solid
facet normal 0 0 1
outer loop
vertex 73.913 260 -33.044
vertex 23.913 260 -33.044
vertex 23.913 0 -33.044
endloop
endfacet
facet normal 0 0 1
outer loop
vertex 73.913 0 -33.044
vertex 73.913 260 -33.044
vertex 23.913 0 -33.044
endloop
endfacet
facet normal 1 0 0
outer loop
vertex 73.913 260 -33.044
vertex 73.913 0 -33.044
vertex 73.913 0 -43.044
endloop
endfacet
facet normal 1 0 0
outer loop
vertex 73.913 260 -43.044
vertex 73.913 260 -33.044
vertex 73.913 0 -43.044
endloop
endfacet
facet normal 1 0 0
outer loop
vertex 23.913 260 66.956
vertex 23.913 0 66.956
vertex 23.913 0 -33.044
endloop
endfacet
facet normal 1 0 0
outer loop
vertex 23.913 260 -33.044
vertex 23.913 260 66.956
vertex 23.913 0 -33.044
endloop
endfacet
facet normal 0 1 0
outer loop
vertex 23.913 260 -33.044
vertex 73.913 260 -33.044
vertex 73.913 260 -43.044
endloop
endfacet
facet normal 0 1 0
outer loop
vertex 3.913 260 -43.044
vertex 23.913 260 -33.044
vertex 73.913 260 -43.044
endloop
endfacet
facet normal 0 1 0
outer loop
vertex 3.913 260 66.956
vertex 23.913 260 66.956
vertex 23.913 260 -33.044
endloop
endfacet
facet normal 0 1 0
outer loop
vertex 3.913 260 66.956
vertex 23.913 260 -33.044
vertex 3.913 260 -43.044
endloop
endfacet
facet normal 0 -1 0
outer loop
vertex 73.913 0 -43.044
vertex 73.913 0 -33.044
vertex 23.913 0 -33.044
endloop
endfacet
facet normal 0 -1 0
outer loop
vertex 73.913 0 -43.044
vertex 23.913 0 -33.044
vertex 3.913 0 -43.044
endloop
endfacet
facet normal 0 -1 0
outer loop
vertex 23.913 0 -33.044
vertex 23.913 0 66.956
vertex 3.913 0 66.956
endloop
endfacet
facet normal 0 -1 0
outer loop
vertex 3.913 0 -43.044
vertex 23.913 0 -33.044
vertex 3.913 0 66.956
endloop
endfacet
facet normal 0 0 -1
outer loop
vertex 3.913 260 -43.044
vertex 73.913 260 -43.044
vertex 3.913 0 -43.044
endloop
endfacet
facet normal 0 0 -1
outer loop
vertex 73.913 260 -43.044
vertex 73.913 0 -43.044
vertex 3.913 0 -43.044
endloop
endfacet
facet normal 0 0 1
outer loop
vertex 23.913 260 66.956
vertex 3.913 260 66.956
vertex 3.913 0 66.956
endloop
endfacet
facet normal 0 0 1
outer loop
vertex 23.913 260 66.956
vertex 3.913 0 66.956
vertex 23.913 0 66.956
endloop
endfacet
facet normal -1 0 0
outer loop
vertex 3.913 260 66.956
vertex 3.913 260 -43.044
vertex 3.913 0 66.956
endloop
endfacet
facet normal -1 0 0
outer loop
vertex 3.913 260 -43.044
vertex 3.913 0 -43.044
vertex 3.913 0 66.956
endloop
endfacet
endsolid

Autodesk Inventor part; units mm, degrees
ref_plane "YZ Plane" through (0, 0, 0) normal (1, 0, 0) x (0, 1, 0)
ref_plane "XZ Plane" through (0, 0, 0) normal (0, 1, 0) x (-1, 0, 0)
ref_plane "XY Plane" through (0, 0, 0) normal (0, 0, 1) x (1, 0, 0)
sketch "Sketch1" plane through (0, 0, 0) normal (0, 1, 0) x (-1, 0, 0)
  line L0 (-3.913, 66.9565) -> (-23.913, 66.9565)
  line L1 (-23.913, 66.9565) -> (-23.913, -43.0435)
  line L2 (-23.913, -43.0435) -> (-3.913, -43.0435)
  line L3 (-3.913, -43.0435) -> (-3.913, 66.9565)
  line L4 (53.6957, 6.9565) -> (-3.913, 6.9565)
  line L5 (-3.913, 6.9565) -> (-3.913, -18.0435)
  line L6 (-3.913, -18.0435) -> (48.6957, -18.0435)
  point P0 (0, 0)
  dimension "d0" = 110
  dimension "d1" = 20
  dimension "d3" = 60
extrude "Extrusion1" add sketch "Sketch1" along normal blind 260
chamfer "Chamfer1" [suppressed]
sketch "Sketch2" plane through (23.913, 0, 66.9565) normal (1, 0, 0) x (0, 0, -1)
  line L0 (110, 0) -> (110, 260) projected
  line L1 (110, 0) -> (0, 0) projected
  line L2 (110, 260) -> (100, 260)
  line L3 (100, 260) -> (100, 0)
  line L4 (100, 0) -> (110, 0)
  line L5 (110, 0) -> (110, 260)
  point P0 (100, 260)
  dimension "d9" = 10
extrude "Extrusion2" add sketch "Sketch2" along normal blind 50
sketch "Sketch4" plane through (3.913, 0, 66.9565) normal (0, 0, 1) x (1, 0, 0)
  circle A0 centre (60, 232) radius 84.5704
  point P0 (-3.913, 0)
extrude "Extrusion4" [suppressed]
sketch "Sketch5" plane through (3.913, 0, -15.0435) normal (0, 0, 1) x (1, 0, 0)
  arc A0 (0, 172.4) -> (15.6361, 160) centre (60, 232) ccw projected
  circle A1 centre (60, 232) radius 37.4531
  point P0 (-3.913, 0)
  point P1 (20, 162.1931)
extrude "Extrusion5" [suppressed]
properties part number "SecondSpindleOsnova" material "Aluminum 6061-AHC"
